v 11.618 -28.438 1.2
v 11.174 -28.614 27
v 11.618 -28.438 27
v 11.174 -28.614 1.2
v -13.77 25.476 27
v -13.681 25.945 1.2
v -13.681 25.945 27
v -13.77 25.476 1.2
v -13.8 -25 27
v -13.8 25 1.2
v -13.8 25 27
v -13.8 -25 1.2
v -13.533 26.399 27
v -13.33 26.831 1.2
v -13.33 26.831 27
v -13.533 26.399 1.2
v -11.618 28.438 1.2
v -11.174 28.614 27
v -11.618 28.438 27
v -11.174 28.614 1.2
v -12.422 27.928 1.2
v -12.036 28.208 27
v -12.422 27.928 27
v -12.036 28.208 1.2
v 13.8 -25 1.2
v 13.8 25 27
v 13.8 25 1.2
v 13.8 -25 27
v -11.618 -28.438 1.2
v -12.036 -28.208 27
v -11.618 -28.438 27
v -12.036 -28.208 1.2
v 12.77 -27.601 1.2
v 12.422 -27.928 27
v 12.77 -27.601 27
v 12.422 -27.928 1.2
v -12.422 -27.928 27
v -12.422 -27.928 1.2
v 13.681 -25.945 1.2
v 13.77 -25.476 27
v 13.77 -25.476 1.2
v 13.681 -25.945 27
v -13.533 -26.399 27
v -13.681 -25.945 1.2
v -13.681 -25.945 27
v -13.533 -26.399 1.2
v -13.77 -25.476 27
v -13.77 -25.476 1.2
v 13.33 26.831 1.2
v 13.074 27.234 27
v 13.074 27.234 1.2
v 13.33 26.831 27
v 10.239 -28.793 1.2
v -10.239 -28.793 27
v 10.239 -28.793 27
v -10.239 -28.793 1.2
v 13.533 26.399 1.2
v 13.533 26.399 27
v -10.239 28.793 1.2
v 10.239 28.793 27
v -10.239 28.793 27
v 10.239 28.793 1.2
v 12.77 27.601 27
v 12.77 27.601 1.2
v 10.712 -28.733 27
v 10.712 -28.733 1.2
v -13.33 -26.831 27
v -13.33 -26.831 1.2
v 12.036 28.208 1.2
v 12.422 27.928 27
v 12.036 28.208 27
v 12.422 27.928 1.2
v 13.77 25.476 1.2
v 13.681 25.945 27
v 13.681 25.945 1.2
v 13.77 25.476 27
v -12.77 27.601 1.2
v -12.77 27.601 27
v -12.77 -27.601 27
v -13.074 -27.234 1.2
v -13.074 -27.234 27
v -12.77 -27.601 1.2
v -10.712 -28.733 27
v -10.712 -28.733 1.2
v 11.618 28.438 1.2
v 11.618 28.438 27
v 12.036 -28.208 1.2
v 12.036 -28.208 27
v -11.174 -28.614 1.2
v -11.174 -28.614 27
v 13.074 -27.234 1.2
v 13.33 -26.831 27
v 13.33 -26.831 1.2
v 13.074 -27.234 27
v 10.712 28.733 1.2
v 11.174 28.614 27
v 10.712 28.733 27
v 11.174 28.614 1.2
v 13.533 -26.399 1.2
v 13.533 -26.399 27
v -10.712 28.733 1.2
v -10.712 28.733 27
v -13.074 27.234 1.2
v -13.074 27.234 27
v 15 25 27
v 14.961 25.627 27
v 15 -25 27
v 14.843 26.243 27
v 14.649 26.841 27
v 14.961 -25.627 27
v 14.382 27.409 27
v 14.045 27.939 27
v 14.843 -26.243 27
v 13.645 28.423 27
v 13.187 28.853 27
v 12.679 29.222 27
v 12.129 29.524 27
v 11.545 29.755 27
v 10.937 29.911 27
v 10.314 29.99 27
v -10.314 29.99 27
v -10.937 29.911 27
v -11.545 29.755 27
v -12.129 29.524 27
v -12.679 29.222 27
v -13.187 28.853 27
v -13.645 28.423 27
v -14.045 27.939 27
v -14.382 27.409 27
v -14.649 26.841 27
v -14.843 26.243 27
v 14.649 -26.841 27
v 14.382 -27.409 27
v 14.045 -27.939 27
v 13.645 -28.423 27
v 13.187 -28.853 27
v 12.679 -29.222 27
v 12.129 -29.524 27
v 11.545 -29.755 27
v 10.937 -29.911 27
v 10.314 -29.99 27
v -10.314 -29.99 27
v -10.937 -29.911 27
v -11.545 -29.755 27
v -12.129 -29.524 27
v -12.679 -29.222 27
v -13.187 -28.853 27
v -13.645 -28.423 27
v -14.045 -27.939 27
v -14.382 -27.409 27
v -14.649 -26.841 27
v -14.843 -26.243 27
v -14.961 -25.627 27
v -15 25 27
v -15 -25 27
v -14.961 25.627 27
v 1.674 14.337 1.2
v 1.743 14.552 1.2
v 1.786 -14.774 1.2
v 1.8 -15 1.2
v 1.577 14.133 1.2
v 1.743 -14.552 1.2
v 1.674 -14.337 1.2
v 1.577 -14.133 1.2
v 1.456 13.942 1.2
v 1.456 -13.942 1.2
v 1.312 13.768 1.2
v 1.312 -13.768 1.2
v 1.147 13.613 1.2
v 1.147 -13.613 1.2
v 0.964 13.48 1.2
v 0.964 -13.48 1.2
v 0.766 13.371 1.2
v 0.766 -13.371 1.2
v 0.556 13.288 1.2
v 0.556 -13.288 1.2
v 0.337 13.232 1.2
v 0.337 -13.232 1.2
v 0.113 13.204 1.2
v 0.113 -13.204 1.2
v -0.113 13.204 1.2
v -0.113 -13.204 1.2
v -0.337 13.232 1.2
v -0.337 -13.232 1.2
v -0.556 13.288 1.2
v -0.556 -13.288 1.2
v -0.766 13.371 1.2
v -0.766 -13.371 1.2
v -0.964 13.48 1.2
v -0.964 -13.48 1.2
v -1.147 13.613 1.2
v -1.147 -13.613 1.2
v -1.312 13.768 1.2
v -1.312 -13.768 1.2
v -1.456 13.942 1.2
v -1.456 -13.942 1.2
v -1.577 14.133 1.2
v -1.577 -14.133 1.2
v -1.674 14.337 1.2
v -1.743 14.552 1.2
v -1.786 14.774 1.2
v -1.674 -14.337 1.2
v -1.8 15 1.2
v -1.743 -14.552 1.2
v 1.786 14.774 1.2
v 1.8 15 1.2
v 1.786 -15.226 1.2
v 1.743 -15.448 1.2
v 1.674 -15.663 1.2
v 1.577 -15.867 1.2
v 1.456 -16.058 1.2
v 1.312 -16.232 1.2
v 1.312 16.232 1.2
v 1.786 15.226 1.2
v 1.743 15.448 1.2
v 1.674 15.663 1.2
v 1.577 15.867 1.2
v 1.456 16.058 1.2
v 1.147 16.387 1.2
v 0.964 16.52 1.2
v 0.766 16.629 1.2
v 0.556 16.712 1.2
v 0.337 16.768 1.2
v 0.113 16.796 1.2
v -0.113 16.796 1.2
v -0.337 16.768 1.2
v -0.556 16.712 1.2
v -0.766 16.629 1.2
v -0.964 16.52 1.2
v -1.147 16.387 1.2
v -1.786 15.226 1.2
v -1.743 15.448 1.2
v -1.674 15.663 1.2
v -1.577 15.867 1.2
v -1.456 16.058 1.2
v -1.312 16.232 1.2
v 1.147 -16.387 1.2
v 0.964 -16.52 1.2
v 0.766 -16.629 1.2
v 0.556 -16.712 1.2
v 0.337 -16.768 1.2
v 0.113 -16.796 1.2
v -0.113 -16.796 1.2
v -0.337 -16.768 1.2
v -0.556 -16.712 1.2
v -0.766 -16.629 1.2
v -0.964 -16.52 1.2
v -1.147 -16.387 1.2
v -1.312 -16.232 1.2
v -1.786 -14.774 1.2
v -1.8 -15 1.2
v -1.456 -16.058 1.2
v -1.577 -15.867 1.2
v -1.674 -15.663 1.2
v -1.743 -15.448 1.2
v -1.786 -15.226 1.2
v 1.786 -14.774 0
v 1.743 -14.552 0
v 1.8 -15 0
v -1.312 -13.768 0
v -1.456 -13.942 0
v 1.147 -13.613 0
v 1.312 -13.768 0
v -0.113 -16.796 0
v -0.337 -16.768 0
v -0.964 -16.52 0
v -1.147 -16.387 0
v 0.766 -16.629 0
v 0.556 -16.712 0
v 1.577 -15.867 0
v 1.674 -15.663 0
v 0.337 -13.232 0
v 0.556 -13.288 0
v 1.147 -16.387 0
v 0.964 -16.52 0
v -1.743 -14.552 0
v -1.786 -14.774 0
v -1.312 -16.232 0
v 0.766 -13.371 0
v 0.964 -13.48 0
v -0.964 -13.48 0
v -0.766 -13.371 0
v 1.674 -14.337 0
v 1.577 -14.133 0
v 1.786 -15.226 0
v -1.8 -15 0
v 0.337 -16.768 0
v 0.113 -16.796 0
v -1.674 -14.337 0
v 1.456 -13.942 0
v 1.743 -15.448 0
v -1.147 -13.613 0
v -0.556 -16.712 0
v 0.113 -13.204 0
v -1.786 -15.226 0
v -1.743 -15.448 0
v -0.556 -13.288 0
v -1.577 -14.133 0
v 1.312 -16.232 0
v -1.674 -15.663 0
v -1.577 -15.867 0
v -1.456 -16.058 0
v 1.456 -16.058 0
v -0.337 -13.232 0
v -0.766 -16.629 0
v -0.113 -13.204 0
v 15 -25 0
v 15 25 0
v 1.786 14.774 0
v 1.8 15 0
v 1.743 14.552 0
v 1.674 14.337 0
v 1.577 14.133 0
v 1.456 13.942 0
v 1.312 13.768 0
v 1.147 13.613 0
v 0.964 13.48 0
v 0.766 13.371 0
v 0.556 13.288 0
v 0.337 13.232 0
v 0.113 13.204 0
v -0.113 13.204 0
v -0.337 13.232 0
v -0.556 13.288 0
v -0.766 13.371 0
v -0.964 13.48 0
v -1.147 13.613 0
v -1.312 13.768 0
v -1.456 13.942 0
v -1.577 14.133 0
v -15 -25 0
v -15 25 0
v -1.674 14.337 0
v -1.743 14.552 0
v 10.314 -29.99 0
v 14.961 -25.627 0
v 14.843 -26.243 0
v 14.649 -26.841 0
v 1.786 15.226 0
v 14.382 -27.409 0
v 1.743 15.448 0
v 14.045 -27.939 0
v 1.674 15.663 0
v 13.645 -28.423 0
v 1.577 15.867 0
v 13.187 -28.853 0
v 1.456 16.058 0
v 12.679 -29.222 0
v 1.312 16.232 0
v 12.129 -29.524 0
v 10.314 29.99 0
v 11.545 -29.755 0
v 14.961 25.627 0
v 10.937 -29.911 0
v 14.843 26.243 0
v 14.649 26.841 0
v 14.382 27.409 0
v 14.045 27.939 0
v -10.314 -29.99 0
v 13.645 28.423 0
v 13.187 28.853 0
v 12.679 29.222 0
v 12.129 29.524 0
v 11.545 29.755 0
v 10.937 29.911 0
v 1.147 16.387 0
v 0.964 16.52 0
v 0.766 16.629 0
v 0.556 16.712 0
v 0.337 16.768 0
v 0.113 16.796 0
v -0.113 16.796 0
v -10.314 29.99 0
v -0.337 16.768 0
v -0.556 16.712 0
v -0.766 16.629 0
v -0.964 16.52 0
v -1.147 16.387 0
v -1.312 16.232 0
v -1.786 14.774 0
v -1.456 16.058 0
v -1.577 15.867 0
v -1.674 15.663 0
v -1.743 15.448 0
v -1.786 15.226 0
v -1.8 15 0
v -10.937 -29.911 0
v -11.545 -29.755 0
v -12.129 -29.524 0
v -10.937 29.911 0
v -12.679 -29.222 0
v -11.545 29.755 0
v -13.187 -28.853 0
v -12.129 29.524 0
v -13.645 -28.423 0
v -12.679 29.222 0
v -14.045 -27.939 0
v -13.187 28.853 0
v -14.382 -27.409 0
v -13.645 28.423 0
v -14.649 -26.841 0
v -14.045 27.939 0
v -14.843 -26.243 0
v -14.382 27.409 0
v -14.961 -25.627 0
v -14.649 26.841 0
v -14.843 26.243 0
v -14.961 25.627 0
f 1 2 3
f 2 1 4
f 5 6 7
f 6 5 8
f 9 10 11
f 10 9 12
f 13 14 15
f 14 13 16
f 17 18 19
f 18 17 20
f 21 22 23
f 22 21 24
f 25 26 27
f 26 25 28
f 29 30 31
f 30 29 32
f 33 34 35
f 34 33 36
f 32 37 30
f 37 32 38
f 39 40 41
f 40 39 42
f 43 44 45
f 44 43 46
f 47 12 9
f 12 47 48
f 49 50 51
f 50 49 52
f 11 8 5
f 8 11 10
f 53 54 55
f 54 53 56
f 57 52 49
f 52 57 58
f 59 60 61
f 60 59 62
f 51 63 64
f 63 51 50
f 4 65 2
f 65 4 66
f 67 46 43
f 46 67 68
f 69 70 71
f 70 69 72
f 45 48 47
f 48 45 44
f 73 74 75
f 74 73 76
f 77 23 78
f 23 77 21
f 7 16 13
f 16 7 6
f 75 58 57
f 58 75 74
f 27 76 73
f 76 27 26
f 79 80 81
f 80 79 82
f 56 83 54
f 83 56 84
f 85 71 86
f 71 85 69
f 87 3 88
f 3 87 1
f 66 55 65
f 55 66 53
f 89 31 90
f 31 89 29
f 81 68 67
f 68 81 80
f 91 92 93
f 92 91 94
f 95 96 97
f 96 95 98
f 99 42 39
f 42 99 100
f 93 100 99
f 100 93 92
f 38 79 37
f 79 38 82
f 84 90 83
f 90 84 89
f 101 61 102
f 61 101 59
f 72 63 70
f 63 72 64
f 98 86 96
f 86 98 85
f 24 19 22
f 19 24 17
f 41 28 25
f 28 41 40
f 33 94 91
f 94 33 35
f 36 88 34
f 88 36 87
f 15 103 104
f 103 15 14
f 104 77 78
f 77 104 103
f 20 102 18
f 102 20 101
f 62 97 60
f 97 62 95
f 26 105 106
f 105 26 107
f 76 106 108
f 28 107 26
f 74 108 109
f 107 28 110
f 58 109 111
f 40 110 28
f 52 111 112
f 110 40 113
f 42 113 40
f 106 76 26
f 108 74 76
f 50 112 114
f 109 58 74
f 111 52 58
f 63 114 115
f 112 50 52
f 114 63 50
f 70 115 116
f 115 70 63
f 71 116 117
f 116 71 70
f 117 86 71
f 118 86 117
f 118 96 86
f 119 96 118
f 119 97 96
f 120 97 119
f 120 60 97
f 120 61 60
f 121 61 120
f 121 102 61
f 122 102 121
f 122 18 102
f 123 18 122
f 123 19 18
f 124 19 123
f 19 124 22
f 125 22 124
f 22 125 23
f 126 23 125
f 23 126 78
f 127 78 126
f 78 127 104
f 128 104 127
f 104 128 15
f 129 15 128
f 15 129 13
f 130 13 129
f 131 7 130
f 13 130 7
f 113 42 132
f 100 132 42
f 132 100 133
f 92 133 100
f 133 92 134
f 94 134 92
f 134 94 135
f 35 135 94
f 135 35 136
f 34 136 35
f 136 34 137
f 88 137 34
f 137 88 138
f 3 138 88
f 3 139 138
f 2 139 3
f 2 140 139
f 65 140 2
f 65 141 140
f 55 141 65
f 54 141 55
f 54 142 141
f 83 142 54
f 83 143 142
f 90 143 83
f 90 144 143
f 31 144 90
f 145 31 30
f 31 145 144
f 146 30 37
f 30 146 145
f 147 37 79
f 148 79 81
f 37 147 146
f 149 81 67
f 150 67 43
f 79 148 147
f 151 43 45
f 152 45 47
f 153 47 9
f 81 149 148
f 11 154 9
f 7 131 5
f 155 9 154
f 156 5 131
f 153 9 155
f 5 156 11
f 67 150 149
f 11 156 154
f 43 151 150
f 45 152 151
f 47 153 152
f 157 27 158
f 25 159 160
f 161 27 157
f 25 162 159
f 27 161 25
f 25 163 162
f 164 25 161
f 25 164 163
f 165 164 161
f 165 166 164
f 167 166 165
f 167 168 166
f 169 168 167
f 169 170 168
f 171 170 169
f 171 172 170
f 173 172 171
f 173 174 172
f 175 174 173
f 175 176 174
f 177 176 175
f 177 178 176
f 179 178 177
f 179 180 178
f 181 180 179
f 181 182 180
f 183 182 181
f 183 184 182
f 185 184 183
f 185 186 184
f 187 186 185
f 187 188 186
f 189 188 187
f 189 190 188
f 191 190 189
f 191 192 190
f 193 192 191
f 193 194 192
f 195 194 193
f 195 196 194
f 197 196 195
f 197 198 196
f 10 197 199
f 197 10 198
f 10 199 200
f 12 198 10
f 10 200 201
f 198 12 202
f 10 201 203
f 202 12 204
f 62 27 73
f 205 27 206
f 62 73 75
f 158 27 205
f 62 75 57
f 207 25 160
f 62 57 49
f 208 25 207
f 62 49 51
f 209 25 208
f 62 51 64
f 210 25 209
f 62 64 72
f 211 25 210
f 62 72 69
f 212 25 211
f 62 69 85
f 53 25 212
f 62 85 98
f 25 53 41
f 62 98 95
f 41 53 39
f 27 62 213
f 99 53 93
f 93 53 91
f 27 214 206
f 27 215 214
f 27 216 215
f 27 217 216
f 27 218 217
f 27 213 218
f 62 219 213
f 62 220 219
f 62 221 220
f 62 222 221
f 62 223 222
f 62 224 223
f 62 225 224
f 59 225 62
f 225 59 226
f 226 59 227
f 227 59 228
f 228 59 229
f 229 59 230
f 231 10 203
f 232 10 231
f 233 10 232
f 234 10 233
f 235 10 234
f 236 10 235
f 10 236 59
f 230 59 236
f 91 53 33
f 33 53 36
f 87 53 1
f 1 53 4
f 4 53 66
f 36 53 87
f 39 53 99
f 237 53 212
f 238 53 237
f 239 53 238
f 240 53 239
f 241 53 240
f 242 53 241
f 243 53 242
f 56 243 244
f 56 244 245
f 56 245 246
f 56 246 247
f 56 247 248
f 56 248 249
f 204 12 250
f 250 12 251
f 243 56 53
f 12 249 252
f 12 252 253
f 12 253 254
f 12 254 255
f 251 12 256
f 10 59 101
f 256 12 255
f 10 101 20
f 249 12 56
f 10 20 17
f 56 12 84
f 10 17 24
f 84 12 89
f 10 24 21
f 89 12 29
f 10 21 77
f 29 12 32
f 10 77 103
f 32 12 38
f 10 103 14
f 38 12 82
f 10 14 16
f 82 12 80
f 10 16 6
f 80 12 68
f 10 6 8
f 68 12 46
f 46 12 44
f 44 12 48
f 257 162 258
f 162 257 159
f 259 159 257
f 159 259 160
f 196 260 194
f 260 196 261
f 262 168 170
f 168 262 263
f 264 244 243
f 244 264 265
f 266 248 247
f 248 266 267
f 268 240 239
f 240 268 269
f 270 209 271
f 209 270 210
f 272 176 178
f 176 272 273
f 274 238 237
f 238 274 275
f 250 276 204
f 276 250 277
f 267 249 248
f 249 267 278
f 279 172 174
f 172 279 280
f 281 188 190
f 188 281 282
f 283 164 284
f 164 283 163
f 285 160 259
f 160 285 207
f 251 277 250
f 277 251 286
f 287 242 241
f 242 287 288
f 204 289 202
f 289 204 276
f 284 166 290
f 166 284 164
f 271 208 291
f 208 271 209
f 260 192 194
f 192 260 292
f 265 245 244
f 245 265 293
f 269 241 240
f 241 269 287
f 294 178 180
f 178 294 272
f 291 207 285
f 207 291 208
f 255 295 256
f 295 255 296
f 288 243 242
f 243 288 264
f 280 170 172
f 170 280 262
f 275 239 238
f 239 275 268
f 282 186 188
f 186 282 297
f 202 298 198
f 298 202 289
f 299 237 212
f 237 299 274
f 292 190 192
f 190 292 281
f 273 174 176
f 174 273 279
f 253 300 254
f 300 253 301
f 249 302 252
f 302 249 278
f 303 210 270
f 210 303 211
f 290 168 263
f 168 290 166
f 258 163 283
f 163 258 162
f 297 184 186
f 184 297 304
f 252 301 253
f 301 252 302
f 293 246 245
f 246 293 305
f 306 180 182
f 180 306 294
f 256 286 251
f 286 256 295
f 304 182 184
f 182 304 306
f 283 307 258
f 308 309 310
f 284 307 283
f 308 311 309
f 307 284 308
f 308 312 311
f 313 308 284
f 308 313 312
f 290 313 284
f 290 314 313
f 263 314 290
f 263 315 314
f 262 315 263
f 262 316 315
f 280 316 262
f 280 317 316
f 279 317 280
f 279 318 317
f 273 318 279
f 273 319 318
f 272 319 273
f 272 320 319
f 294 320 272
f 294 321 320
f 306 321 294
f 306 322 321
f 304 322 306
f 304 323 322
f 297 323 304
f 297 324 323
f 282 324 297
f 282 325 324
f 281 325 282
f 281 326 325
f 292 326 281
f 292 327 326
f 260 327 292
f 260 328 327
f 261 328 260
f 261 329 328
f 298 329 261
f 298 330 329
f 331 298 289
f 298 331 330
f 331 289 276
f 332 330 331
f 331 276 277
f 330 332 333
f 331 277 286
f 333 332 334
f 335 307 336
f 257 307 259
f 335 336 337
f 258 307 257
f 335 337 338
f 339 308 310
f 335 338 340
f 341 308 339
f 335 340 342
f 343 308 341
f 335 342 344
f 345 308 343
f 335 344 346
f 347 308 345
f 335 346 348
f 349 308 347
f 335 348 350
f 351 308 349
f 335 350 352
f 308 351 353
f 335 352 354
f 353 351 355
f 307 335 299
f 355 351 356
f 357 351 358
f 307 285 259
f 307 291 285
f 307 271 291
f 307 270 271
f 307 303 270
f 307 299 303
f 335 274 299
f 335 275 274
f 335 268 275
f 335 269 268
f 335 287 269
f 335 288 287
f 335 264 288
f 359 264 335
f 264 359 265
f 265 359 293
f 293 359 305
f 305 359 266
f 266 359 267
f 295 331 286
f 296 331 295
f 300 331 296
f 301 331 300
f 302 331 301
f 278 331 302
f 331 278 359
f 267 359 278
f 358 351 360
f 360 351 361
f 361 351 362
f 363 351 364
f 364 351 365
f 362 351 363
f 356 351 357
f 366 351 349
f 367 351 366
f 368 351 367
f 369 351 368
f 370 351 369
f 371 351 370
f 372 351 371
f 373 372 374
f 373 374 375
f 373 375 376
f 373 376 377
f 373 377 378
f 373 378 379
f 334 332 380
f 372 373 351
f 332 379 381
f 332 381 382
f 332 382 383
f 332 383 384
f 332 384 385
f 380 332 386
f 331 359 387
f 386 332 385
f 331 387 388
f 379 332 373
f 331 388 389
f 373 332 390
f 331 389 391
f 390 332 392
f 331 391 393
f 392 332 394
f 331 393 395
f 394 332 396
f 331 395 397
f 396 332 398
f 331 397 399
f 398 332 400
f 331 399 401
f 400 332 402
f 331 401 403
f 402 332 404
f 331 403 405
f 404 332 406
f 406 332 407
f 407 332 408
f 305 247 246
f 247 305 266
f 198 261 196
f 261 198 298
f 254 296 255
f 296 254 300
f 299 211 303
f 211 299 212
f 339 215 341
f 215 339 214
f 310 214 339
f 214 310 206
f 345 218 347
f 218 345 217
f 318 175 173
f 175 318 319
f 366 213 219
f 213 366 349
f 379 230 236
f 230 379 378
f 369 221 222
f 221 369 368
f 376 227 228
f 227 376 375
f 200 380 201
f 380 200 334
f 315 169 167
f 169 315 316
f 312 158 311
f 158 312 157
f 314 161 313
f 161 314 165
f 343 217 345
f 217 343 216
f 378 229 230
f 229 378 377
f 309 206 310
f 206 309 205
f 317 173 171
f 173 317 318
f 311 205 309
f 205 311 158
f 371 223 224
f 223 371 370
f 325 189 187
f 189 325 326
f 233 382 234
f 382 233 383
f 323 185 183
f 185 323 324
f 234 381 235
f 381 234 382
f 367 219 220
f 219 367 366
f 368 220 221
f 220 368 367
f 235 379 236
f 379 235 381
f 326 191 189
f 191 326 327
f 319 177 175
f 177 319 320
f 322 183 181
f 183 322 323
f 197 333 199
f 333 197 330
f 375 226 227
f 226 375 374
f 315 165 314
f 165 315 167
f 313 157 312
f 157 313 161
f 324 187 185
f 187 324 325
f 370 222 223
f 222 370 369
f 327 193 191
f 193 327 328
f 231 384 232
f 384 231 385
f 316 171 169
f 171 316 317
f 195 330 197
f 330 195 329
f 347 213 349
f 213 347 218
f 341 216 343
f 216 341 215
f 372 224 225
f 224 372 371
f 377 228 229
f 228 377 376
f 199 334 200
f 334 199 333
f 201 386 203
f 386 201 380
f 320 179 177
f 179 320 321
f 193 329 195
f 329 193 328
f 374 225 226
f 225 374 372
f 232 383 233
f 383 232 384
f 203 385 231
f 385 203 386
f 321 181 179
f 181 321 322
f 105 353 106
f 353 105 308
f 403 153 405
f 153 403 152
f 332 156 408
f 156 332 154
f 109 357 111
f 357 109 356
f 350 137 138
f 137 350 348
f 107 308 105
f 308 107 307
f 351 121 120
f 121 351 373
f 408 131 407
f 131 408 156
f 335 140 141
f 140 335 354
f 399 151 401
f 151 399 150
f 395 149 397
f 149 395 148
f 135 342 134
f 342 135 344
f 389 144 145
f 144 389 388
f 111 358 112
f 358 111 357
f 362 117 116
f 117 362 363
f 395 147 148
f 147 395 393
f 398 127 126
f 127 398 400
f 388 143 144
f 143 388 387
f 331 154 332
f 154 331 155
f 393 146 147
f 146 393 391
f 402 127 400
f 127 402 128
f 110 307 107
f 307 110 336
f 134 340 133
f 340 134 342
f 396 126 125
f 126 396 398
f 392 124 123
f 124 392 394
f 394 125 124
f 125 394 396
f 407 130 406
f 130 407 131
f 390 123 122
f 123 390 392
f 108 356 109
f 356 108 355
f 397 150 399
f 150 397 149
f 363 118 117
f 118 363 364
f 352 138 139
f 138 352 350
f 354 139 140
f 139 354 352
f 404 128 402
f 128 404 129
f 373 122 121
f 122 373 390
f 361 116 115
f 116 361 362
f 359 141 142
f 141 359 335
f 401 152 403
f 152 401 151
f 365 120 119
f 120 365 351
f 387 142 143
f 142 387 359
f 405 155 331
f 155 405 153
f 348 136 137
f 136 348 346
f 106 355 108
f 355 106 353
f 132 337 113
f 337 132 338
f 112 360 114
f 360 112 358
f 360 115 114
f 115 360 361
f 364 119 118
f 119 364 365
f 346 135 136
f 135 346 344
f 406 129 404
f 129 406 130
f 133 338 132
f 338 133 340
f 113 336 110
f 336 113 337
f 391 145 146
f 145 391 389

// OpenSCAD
$fn = 50;


difference() {
	union() {
		hull() {
			translate(v = [-10.0000000000, 25.0000000000, 0]) {
				cylinder(h = 27, r = 5);
			}
			translate(v = [10.0000000000, 25.0000000000, 0]) {
				cylinder(h = 27, r = 5);
			}
			translate(v = [-10.0000000000, -25.0000000000, 0]) {
				cylinder(h = 27, r = 5);
			}
			translate(v = [10.0000000000, -25.0000000000, 0]) {
				cylinder(h = 27, r = 5);
			}
		}
	}
	union() {
		translate(v = [0, 0, 1.2000000000]) {
			hull() {
				translate(v = [-10.0000000000, 25.0000000000, 0]) {
					cylinder(h = 25.8000000000, r = 3.8000000000);
				}
				translate(v = [10.0000000000, 25.0000000000, 0]) {
					cylinder(h = 25.8000000000, r = 3.8000000000);
				}
				translate(v = [-10.0000000000, -25.0000000000, 0]) {
					cylinder(h = 25.8000000000, r = 3.8000000000);
				}
				translate(v = [10.0000000000, -25.0000000000, 0]) {
					cylinder(h = 25.8000000000, r = 3.8000000000);
				}
			}
		}
		#translate(v = [0.0000000000, -15.0000000000, 0]) {
			cylinder(h = 1.2000000000, r = 1.8000000000);
		}
		#translate(v = [0.0000000000, 15.0000000000, 0]) {
			cylinder(h = 1.2000000000, r = 1.8000000000);
		}
	}
}
